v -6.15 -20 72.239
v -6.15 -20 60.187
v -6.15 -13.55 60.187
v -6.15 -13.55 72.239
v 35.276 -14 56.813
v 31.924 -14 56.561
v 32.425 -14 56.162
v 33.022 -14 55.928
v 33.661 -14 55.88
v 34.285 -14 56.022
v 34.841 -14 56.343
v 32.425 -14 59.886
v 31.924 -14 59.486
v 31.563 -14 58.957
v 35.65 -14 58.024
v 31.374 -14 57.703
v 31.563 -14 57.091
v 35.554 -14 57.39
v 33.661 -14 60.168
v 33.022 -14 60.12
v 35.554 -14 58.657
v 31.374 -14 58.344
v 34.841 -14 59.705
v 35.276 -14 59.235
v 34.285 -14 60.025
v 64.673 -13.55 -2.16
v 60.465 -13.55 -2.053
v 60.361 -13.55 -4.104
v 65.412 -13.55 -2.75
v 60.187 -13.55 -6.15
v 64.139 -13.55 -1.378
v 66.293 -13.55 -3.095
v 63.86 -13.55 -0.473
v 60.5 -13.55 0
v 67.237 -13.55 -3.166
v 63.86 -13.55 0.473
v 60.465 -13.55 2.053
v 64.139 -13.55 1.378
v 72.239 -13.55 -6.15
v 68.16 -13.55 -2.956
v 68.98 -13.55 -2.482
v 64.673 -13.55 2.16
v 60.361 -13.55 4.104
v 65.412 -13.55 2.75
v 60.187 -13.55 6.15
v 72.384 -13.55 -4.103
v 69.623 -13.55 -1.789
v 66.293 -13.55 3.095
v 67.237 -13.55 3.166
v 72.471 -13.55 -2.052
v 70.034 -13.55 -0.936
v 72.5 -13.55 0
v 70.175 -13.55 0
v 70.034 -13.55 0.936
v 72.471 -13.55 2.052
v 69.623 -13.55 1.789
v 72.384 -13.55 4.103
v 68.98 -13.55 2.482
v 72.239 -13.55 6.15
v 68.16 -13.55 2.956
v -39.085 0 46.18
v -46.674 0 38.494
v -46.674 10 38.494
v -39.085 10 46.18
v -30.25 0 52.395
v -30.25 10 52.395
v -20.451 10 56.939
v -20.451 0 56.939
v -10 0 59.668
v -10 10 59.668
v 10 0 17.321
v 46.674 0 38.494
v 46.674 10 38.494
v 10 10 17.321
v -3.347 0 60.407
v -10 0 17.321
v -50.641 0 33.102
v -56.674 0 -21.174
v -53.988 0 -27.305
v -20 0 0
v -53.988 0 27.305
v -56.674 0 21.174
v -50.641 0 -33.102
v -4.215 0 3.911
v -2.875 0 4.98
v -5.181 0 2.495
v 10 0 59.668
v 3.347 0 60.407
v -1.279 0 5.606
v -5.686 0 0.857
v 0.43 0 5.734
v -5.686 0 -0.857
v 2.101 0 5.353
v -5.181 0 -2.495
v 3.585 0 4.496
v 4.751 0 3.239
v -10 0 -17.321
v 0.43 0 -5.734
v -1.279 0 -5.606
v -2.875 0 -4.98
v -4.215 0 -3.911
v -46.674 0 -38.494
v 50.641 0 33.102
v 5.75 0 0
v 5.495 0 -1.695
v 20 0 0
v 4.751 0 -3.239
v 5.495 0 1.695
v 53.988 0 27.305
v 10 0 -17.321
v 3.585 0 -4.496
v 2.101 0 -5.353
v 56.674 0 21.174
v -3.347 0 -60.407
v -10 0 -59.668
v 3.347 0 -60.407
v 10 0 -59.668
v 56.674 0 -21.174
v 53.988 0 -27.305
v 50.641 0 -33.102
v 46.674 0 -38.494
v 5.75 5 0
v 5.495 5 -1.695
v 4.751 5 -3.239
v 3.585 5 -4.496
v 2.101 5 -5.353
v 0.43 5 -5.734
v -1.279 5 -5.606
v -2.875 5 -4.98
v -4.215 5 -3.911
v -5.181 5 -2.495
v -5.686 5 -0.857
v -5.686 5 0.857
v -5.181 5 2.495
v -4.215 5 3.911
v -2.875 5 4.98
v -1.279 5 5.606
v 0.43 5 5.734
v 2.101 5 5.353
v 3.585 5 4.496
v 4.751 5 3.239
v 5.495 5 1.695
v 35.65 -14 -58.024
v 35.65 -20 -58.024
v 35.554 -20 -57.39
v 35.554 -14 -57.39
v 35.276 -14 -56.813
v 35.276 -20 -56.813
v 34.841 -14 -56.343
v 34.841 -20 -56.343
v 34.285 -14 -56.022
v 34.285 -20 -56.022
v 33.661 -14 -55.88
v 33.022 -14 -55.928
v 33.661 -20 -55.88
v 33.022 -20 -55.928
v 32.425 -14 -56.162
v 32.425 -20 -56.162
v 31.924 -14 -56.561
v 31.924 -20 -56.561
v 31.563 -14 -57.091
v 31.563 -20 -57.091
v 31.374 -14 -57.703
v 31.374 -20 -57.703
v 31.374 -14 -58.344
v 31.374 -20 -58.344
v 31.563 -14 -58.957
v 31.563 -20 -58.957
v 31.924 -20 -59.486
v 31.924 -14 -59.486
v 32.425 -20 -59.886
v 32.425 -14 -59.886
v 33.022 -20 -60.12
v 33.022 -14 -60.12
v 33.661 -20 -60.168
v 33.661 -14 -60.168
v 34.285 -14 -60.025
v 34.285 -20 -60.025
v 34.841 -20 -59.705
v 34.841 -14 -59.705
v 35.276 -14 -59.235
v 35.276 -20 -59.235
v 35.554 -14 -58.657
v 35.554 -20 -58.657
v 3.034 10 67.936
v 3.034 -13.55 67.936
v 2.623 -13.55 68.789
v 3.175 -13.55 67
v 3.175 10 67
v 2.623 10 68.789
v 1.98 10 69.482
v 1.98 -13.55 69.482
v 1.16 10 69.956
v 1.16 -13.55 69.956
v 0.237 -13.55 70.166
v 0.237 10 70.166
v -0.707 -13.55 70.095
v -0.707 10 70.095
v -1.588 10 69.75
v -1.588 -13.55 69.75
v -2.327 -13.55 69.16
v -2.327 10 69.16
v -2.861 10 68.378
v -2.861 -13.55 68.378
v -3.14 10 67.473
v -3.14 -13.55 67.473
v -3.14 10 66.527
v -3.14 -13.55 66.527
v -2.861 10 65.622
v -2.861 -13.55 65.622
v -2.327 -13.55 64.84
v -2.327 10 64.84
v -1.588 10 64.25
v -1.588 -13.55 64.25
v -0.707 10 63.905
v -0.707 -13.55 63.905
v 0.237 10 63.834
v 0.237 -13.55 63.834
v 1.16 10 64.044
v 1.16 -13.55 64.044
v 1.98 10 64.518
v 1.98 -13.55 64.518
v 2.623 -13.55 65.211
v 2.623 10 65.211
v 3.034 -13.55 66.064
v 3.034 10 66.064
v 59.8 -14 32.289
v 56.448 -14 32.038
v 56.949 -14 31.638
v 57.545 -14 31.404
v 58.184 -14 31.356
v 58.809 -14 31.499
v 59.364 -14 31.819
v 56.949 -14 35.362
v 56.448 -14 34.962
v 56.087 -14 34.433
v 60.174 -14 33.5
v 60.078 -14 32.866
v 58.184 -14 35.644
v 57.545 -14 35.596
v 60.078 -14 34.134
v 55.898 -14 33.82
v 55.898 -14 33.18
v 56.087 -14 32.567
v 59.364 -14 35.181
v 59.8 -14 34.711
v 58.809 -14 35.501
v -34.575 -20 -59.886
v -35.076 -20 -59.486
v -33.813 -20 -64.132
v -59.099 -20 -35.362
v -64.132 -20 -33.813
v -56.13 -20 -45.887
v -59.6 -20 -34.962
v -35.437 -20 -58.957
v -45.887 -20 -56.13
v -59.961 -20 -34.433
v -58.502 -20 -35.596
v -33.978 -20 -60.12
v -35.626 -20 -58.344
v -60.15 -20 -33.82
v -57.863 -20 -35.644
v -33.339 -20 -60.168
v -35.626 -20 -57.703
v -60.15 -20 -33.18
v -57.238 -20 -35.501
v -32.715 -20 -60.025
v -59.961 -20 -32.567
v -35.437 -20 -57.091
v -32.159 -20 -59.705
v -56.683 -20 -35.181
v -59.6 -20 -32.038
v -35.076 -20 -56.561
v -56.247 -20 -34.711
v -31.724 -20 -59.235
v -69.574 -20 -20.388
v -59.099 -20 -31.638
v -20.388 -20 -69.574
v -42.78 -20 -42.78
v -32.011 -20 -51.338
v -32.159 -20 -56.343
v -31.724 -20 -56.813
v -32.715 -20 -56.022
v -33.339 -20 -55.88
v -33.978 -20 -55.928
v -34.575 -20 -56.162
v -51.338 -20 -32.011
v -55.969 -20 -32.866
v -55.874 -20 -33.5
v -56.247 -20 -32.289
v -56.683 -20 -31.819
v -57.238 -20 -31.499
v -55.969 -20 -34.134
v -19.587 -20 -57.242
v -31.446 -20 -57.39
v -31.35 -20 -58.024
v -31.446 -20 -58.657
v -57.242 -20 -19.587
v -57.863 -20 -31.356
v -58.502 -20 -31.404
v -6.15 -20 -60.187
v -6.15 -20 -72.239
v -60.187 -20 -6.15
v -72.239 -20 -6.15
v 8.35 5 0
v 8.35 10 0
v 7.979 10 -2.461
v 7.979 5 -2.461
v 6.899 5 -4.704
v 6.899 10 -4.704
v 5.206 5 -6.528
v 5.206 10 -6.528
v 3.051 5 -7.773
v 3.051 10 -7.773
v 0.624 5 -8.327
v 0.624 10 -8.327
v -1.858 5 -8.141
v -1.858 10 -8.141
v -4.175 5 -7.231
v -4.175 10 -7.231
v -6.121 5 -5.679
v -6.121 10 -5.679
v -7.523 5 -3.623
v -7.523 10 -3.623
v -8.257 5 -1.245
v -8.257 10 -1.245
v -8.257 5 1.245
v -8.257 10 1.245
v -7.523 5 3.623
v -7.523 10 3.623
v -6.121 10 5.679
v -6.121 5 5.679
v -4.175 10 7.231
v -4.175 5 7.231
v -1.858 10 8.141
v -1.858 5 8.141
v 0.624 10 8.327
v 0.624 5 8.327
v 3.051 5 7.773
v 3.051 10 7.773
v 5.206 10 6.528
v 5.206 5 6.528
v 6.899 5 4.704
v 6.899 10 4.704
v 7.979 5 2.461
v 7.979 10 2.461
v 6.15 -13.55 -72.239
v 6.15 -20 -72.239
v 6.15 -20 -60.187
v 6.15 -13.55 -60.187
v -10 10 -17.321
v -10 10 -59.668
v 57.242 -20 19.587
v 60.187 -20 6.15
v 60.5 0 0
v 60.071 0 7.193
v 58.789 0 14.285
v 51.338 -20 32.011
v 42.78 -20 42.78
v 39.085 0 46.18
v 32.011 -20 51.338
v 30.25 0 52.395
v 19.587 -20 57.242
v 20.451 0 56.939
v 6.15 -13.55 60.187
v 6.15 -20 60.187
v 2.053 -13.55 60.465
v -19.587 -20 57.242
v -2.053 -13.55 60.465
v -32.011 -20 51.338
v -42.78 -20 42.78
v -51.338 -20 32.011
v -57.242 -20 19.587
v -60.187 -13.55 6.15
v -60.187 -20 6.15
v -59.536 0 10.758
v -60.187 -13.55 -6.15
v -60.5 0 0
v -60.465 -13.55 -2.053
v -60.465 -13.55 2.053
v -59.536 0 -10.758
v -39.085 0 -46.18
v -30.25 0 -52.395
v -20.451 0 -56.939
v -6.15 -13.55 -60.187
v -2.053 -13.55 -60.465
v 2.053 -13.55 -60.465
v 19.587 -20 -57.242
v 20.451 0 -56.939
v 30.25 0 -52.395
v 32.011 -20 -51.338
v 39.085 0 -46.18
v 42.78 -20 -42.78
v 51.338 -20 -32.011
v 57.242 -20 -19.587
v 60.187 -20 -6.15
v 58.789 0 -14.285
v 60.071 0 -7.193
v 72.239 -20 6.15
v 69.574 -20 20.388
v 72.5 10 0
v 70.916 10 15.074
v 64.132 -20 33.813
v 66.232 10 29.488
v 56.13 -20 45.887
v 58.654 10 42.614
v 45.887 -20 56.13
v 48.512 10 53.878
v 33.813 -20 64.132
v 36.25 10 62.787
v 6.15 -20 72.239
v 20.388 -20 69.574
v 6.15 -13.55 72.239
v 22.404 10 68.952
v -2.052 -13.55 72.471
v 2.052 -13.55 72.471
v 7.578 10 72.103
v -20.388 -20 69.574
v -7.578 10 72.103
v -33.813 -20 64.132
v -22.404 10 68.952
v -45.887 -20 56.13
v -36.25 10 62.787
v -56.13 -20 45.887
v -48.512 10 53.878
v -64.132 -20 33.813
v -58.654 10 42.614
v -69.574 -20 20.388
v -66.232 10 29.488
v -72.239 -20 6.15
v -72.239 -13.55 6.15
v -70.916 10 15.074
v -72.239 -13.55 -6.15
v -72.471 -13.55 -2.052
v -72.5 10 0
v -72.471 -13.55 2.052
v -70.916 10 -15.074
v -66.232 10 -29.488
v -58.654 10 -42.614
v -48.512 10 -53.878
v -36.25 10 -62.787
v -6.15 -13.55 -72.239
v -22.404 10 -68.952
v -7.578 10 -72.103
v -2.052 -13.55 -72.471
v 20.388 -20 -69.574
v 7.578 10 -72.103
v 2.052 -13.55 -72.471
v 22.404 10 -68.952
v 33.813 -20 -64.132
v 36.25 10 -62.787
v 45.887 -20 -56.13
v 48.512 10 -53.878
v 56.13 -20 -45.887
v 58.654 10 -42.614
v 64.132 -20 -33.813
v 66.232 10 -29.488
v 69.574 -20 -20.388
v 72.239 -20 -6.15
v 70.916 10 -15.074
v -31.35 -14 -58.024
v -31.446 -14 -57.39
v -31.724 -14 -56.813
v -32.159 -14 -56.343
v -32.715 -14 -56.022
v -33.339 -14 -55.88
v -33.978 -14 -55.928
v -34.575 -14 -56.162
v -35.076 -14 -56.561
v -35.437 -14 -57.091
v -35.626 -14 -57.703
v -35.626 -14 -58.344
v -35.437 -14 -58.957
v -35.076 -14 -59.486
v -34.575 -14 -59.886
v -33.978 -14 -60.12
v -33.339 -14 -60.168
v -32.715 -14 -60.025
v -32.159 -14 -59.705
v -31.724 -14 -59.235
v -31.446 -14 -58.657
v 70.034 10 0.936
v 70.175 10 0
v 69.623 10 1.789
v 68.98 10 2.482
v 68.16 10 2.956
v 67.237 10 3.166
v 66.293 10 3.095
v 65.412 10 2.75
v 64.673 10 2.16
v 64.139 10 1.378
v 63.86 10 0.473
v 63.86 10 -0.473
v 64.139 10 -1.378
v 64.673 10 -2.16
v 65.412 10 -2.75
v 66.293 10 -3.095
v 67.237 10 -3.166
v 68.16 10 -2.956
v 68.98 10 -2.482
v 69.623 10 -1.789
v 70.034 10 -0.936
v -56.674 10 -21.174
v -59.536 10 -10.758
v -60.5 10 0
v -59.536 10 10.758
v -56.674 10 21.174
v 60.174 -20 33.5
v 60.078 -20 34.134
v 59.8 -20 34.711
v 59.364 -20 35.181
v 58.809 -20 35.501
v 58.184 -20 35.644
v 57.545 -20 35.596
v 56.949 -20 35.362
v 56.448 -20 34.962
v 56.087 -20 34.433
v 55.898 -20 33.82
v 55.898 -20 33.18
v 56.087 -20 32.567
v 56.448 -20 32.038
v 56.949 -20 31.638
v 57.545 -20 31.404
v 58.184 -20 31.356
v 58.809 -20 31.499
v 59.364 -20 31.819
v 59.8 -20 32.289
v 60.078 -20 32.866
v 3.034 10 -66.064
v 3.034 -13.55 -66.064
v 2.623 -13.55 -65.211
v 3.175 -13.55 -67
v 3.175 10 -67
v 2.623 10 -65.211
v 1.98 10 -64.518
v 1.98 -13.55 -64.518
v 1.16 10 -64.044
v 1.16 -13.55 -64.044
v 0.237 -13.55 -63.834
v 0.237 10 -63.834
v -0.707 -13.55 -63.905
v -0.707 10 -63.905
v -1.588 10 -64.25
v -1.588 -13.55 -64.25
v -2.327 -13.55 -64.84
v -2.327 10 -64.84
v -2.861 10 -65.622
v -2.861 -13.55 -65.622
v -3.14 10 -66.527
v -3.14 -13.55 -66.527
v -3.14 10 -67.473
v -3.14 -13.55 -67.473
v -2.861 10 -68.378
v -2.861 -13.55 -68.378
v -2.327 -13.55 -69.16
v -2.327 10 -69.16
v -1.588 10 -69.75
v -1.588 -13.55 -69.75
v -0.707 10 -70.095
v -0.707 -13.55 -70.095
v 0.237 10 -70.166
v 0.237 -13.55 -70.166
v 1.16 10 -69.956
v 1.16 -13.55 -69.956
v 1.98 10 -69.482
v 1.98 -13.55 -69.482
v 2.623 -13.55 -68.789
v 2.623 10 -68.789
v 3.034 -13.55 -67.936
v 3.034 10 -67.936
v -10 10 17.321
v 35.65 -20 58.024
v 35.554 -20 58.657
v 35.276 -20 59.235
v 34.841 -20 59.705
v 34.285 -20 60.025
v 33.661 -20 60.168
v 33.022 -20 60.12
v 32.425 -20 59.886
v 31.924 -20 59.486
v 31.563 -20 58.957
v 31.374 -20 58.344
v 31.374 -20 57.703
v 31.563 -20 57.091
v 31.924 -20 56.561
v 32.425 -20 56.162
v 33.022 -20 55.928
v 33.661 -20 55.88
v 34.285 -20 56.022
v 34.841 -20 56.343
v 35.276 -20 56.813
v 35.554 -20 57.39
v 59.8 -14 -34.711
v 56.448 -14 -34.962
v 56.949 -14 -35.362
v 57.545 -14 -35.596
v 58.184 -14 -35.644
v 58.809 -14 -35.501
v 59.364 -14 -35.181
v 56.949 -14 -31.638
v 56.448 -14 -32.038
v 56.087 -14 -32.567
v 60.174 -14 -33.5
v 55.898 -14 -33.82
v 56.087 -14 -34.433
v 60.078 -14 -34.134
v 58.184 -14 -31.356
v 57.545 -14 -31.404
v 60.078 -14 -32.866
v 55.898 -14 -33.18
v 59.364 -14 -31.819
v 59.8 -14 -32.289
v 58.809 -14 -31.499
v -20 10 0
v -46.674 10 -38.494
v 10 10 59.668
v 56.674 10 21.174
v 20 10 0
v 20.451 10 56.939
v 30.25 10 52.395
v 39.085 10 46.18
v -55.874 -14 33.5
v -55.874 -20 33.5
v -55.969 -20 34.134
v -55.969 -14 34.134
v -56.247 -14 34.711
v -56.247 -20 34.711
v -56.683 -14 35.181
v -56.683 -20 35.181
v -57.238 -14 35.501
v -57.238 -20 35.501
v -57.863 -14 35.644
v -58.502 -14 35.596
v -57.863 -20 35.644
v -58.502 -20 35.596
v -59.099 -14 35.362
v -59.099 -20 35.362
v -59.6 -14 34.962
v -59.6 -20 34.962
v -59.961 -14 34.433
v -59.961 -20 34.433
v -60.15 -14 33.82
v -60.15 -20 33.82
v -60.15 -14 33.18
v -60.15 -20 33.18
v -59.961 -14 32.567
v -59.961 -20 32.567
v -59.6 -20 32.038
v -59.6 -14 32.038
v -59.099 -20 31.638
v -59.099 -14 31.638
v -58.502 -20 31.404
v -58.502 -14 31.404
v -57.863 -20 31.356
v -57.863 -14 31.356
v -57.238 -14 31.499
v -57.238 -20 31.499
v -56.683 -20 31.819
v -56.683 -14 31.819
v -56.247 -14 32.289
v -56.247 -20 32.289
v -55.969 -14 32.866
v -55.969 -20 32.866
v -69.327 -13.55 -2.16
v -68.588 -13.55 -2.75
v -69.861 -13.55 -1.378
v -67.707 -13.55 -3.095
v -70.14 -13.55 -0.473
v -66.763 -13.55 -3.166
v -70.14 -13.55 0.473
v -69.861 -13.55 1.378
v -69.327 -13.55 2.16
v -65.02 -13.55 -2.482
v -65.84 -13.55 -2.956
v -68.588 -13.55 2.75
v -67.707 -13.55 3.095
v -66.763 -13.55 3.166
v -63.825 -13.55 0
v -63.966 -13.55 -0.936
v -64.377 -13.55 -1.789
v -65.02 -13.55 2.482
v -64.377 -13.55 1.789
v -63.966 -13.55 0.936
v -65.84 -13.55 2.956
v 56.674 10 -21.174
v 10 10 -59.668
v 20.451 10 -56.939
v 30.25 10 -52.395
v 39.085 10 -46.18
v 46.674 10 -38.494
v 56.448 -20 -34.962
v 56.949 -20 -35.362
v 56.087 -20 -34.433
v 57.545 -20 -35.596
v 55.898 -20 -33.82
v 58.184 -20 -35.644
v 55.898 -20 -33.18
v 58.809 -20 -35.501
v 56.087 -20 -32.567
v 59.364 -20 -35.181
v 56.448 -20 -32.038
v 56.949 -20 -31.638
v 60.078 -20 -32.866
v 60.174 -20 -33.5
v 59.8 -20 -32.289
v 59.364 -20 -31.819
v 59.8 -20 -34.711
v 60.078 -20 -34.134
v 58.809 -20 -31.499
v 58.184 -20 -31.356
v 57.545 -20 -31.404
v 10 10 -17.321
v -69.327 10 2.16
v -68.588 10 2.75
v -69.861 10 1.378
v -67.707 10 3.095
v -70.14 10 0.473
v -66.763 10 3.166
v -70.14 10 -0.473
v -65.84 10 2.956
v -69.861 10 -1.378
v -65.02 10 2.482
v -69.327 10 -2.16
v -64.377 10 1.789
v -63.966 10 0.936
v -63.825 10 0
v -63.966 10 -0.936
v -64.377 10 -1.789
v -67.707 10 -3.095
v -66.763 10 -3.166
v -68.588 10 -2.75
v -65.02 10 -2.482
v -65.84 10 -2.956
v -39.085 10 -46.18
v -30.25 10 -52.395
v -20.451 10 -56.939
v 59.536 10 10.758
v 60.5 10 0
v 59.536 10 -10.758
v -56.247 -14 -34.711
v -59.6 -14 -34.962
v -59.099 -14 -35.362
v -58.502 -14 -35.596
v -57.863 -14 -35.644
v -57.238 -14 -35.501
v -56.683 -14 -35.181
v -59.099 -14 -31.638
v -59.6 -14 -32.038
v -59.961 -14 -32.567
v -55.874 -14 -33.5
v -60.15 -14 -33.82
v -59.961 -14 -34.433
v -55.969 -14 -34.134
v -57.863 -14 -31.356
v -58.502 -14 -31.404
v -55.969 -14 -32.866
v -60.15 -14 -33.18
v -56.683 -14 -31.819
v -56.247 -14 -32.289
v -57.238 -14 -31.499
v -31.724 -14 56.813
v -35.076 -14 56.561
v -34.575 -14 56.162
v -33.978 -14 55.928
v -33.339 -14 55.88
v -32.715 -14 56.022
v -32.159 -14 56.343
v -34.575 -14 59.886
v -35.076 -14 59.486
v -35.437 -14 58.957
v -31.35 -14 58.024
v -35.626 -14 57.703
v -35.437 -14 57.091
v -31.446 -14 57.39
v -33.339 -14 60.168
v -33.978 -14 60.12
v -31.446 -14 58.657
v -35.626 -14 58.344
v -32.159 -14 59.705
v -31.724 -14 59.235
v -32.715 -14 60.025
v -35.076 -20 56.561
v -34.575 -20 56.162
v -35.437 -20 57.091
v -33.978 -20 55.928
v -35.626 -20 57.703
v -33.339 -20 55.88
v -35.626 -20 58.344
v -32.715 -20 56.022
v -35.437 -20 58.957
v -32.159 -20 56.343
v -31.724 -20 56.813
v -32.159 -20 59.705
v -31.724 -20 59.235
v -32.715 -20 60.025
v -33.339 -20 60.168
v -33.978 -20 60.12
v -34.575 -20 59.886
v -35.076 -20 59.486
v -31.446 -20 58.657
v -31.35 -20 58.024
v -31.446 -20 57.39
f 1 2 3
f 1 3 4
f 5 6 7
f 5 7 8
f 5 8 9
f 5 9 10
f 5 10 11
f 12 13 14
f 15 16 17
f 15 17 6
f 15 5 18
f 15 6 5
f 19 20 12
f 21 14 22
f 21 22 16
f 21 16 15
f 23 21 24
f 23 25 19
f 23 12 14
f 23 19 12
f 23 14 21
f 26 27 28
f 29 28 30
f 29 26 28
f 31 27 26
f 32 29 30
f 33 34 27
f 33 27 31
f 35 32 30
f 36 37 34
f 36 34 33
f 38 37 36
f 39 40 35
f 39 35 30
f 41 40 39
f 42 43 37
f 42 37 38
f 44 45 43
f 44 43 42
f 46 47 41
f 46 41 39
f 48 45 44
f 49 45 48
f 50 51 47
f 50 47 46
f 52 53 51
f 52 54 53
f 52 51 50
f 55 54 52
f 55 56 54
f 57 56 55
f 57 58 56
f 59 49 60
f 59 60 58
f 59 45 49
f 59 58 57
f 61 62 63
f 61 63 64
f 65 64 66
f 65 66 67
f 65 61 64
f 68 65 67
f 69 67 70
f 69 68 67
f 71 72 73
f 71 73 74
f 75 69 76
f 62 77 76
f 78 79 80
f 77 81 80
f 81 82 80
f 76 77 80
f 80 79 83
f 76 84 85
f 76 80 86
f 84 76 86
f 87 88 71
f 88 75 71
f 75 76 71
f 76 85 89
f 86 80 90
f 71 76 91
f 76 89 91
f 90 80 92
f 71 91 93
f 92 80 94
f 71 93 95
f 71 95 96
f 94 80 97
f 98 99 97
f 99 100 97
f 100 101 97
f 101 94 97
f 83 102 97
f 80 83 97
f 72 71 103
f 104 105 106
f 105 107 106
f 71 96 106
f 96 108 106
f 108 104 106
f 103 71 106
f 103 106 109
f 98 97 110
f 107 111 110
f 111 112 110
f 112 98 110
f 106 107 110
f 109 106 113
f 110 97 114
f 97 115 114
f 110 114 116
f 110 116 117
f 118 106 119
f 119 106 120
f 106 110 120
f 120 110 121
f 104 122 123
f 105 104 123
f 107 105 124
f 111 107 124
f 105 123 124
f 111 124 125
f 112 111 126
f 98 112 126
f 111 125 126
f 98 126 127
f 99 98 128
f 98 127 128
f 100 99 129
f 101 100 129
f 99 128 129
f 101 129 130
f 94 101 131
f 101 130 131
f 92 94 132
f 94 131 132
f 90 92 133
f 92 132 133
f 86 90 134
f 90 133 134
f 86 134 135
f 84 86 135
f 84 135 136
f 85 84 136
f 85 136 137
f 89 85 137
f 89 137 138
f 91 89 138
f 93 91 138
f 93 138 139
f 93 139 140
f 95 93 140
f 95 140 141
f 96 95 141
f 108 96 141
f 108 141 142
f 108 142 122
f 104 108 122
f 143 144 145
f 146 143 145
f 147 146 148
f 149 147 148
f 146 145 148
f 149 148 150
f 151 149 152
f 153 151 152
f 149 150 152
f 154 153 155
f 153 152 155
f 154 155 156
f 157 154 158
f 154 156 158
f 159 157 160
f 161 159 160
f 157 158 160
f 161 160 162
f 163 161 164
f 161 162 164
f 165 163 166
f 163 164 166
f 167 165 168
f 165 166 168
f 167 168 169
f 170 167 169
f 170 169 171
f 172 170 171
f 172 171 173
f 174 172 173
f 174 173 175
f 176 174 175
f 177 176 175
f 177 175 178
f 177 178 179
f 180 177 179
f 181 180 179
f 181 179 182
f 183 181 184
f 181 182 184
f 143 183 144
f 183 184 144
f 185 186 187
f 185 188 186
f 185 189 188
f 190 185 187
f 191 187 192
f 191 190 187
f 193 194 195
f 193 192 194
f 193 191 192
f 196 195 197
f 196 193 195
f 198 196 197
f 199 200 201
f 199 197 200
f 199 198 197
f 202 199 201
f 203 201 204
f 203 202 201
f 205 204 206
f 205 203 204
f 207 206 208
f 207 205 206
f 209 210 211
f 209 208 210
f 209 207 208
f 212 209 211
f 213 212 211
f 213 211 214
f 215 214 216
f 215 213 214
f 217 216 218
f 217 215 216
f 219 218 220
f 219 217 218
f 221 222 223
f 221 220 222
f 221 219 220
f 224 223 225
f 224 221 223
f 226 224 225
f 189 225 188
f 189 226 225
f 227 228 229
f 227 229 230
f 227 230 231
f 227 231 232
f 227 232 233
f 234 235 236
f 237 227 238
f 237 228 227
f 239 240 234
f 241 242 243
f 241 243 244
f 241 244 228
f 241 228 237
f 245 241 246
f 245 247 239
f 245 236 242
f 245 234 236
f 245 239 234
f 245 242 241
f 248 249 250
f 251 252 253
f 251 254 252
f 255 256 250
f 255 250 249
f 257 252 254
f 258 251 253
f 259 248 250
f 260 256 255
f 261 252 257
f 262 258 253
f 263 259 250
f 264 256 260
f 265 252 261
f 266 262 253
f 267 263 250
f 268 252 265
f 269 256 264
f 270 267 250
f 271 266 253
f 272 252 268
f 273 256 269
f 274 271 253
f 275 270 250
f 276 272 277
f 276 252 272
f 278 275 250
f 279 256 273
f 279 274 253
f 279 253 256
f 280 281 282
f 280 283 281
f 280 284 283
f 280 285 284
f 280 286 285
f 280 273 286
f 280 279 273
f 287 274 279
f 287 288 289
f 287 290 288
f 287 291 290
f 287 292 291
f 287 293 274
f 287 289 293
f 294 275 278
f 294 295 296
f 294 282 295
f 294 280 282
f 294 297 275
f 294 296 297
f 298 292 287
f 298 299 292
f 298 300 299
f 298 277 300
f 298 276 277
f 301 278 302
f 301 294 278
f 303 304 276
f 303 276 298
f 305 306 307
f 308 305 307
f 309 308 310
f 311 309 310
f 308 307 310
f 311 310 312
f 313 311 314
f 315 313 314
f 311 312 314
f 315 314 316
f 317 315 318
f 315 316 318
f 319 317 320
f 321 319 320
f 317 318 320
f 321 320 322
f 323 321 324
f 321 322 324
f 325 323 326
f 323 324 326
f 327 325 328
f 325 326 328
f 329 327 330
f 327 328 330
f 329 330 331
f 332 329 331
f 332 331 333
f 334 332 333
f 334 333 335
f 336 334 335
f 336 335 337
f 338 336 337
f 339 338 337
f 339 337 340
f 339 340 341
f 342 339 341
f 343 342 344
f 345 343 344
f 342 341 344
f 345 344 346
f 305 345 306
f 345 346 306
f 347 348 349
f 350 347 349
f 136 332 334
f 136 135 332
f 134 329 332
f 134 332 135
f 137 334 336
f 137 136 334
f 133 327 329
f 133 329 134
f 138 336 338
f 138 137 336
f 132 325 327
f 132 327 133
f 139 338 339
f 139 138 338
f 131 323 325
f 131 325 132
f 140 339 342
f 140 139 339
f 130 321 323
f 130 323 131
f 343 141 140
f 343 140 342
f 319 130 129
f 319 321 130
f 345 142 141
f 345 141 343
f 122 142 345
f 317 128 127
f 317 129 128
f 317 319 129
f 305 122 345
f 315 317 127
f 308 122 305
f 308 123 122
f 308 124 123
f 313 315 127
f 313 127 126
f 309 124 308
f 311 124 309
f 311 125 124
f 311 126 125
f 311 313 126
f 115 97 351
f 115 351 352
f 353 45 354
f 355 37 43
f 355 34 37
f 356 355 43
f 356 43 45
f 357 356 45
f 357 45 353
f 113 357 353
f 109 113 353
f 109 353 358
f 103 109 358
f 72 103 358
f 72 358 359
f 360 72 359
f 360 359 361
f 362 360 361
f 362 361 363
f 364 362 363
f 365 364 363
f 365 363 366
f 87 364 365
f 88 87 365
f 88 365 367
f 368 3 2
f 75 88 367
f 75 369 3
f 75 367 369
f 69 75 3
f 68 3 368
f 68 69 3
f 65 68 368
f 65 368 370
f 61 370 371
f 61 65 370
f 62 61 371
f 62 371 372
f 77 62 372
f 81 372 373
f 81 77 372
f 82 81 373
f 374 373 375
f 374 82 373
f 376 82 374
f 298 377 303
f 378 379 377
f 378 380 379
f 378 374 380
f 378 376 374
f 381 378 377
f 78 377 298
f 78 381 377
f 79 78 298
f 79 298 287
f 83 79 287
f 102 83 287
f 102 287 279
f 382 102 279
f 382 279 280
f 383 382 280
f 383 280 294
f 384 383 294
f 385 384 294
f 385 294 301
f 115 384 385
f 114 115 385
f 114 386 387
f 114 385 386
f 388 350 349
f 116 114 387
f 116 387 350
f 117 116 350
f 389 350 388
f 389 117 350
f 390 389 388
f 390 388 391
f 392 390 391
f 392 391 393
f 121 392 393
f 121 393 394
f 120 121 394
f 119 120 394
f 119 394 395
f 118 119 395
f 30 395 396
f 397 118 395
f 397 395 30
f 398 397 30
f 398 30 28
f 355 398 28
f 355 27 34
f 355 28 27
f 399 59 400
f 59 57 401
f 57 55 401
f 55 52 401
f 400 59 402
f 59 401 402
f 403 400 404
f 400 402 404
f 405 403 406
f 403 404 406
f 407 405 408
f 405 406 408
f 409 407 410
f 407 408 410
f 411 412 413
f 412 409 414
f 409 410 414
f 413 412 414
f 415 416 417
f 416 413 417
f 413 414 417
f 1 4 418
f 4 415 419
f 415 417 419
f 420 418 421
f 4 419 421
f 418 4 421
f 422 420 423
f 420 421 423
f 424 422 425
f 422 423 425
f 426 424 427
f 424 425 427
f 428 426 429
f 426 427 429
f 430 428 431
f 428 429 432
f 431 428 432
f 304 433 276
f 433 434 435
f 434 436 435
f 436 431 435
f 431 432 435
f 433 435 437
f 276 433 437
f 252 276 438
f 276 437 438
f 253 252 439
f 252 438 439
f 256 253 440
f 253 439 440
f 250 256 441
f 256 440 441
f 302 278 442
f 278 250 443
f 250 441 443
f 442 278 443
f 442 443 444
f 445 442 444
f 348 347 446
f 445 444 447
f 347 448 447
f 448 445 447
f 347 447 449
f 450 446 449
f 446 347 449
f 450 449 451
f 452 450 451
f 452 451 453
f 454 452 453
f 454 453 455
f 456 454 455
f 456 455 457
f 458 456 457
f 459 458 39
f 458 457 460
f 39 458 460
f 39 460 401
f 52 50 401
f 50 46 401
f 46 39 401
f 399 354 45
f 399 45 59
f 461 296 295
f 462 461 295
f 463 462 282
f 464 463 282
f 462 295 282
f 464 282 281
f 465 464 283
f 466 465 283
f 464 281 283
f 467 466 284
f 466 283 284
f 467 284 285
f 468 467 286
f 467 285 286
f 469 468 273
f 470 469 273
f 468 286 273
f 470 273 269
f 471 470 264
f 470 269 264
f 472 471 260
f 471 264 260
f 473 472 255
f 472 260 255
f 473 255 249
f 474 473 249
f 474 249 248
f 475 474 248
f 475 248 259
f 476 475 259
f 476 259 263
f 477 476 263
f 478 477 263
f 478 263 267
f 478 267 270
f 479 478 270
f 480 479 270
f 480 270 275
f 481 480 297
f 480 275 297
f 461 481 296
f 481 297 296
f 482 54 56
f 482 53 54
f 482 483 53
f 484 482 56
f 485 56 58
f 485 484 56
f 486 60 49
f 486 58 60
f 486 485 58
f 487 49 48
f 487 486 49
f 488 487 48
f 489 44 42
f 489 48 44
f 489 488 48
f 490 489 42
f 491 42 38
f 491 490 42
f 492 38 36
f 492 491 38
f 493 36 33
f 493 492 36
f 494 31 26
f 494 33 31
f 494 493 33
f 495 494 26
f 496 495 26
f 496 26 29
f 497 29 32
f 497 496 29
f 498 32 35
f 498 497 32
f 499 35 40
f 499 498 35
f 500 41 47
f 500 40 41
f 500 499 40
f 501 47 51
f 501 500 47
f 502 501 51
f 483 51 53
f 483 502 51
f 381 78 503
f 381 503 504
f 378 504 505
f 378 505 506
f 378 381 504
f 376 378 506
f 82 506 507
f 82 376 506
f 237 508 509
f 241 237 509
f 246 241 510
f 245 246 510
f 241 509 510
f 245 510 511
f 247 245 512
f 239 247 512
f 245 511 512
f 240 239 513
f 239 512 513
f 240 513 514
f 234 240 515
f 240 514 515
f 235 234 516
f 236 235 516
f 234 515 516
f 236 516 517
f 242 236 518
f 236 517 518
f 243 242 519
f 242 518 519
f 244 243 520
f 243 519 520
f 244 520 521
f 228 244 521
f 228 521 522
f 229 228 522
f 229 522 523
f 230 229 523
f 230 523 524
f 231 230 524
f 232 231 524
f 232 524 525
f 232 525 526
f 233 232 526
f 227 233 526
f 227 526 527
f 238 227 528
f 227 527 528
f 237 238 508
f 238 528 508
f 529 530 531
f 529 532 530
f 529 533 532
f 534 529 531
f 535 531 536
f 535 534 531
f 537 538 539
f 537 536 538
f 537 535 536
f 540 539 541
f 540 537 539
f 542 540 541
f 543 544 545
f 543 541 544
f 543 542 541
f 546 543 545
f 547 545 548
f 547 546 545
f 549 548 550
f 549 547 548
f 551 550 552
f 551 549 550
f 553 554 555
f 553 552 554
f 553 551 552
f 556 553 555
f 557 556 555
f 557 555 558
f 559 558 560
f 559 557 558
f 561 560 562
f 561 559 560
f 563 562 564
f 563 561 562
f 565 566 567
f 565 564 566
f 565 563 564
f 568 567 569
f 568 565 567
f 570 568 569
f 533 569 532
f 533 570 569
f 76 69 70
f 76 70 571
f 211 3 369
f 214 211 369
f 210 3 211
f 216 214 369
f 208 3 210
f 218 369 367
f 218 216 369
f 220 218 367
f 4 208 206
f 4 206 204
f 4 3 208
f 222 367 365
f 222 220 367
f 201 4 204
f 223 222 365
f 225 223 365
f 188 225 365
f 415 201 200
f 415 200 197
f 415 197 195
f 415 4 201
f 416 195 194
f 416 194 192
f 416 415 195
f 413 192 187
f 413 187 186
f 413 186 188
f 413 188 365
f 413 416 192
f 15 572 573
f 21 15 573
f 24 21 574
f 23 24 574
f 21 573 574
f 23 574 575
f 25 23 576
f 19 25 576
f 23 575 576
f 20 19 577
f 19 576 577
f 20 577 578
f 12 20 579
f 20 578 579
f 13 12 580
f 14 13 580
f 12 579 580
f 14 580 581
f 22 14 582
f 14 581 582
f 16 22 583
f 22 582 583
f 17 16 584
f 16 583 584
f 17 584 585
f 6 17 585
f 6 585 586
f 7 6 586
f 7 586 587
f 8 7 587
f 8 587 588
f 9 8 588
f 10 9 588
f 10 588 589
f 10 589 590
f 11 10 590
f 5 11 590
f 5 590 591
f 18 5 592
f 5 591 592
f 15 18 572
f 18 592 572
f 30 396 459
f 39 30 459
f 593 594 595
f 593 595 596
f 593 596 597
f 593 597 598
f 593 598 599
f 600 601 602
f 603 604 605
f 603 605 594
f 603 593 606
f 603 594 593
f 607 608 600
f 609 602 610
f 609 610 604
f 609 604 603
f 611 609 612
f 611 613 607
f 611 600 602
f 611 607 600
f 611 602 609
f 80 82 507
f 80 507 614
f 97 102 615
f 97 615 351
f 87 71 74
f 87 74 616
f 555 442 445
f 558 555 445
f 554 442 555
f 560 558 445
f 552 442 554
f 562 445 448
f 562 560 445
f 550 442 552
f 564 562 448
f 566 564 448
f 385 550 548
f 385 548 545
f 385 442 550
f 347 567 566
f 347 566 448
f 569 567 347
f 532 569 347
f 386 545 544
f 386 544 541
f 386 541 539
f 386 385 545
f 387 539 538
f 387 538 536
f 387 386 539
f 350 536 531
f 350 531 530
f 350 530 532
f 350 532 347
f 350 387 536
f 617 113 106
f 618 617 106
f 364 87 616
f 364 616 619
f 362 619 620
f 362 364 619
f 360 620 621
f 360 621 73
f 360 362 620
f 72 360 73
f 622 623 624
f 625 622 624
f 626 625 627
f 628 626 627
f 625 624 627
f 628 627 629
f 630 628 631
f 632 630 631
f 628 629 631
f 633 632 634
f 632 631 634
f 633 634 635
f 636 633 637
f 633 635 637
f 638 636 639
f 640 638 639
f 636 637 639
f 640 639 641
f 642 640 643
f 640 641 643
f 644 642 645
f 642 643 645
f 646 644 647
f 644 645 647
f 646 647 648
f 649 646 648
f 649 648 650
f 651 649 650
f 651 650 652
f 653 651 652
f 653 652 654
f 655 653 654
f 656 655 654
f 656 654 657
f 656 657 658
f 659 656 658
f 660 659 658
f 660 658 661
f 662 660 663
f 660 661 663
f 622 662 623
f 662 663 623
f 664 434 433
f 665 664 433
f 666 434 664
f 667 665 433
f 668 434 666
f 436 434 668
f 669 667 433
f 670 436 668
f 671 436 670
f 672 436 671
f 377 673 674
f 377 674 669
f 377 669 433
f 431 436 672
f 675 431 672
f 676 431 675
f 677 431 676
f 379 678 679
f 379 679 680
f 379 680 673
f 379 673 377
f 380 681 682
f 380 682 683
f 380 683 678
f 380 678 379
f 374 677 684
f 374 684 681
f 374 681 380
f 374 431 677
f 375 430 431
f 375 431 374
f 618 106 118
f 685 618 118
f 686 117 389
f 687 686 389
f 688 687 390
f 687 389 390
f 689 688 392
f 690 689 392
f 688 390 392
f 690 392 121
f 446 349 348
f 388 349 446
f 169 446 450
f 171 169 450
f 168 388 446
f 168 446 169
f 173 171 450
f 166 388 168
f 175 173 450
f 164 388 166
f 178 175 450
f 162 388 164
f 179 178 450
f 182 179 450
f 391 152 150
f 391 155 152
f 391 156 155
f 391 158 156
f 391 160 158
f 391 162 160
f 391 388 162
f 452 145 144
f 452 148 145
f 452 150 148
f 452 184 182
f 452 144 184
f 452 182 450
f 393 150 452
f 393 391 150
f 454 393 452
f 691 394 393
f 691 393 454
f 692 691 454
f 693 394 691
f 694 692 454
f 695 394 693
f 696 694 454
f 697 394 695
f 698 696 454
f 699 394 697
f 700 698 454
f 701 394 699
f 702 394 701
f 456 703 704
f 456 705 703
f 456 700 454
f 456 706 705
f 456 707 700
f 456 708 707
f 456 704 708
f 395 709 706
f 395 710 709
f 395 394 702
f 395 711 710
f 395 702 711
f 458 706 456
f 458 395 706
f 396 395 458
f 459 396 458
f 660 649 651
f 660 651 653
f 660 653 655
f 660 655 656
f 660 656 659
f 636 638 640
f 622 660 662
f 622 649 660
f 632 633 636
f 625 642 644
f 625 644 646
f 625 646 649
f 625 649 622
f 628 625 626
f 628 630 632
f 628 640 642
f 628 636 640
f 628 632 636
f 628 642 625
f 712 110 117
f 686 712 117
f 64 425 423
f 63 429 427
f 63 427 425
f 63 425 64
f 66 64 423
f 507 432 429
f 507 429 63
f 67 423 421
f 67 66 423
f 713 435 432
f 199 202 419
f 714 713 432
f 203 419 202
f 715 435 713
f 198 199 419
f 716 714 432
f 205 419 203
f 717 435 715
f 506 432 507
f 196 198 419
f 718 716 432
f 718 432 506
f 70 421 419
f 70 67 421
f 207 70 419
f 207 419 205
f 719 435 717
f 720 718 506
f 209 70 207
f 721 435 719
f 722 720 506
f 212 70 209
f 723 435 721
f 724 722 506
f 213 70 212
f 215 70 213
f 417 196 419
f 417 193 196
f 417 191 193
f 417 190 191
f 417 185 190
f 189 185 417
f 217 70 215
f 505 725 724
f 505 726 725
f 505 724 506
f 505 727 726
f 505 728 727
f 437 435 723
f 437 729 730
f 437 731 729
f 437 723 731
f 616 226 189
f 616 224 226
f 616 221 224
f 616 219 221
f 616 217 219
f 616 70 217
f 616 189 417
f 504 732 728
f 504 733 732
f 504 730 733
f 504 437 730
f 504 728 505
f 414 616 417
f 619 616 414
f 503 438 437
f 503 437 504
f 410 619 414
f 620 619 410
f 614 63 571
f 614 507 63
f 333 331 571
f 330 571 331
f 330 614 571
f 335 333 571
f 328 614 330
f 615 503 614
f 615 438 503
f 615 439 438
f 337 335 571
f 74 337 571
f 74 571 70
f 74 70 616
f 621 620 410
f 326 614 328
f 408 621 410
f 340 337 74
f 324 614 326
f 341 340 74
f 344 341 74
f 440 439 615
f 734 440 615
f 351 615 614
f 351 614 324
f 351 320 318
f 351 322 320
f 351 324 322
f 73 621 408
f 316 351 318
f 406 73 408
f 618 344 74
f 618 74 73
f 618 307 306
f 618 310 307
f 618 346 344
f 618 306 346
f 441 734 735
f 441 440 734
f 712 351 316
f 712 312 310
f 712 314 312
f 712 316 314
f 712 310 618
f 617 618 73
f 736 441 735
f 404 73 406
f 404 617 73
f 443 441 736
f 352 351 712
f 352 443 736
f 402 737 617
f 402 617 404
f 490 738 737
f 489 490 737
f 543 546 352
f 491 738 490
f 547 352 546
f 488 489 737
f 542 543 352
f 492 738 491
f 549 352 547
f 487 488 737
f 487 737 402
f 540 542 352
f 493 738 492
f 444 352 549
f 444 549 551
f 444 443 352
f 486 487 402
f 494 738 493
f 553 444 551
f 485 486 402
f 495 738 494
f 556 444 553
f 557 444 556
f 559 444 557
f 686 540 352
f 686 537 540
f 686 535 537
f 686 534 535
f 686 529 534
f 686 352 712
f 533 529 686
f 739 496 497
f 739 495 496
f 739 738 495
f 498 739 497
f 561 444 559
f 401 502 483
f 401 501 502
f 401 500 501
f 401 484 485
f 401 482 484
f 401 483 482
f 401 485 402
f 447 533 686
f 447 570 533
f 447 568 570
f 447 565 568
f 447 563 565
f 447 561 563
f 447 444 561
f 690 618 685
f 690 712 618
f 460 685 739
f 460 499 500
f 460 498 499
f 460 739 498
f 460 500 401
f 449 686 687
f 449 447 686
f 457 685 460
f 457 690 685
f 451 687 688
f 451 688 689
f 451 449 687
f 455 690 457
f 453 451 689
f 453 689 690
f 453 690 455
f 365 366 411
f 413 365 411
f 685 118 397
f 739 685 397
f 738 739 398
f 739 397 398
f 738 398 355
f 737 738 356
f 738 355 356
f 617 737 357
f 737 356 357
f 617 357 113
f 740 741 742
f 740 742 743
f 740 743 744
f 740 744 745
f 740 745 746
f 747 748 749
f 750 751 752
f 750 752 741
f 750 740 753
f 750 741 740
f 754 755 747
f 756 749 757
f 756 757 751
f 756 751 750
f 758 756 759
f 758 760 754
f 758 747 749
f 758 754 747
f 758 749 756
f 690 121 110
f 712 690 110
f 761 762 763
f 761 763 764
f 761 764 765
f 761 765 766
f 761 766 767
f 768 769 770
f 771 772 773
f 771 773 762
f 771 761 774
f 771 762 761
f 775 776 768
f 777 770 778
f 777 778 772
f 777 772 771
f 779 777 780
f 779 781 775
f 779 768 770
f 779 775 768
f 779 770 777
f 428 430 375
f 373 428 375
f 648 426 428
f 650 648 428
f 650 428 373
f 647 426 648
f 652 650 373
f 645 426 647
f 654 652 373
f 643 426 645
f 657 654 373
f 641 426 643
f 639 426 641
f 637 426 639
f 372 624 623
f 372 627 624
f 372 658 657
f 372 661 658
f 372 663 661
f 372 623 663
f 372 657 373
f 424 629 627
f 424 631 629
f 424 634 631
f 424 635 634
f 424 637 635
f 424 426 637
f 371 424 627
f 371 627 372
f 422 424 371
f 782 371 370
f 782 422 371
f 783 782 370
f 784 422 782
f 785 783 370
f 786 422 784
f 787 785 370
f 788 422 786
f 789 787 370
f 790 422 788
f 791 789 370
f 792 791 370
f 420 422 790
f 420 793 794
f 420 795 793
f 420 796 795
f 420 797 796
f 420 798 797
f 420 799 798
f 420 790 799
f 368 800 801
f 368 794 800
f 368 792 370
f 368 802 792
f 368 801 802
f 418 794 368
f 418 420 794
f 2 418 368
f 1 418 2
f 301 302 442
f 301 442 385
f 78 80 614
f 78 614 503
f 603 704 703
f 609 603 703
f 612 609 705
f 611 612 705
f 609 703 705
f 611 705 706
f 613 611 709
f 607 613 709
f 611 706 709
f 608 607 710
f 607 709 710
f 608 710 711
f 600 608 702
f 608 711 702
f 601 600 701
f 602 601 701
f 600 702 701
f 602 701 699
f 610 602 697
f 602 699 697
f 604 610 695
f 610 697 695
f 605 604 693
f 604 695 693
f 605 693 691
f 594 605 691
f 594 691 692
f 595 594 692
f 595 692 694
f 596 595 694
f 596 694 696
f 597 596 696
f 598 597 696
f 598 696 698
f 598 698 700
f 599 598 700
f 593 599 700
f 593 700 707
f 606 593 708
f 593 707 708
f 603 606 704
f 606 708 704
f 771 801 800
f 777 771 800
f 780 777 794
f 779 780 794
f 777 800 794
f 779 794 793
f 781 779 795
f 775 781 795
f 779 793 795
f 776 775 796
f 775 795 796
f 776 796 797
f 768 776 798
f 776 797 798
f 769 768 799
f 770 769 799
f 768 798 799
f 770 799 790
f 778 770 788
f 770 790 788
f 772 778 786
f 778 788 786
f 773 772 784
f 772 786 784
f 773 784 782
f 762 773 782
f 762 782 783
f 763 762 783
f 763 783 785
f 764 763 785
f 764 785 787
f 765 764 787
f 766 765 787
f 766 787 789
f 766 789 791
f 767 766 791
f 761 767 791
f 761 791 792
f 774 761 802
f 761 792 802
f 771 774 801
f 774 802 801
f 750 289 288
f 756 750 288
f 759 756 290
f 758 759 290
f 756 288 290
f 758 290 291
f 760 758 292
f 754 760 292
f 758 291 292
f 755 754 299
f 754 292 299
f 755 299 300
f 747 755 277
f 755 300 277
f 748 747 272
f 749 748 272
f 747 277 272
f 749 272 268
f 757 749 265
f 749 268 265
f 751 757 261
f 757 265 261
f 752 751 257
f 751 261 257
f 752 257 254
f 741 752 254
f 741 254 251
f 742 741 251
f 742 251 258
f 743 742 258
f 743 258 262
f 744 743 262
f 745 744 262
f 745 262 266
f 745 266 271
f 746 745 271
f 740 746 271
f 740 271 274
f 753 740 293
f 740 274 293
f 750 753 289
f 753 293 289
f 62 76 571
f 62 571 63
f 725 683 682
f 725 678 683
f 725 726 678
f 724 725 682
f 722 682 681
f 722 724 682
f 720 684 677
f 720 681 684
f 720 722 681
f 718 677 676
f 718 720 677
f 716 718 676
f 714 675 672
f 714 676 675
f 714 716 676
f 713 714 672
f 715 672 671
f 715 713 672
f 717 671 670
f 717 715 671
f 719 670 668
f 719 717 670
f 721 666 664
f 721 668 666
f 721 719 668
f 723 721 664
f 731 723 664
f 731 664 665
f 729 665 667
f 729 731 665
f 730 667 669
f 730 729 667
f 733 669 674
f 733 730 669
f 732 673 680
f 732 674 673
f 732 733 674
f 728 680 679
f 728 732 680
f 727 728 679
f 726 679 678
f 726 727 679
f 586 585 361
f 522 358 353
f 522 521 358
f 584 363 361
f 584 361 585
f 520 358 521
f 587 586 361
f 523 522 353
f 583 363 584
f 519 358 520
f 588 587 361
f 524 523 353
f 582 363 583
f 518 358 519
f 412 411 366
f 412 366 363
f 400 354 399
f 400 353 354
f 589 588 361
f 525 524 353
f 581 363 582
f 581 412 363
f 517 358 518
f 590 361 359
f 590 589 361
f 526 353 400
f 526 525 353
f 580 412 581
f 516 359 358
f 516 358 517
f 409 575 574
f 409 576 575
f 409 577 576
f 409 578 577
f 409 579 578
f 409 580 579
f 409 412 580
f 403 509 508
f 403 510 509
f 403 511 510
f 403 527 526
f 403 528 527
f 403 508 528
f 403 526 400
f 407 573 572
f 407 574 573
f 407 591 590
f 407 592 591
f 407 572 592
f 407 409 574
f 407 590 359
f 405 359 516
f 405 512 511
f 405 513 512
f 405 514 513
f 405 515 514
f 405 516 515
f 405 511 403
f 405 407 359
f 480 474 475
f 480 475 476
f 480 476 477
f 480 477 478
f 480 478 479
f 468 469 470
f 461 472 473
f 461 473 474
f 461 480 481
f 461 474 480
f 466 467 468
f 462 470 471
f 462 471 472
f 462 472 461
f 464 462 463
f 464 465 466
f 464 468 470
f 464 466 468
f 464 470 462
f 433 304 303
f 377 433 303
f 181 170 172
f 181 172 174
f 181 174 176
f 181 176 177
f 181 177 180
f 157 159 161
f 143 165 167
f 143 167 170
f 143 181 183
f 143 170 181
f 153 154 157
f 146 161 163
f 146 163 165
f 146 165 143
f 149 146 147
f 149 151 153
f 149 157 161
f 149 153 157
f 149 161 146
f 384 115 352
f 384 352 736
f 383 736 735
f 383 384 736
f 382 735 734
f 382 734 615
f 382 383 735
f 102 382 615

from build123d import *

# Parameters (mm, degrees)
SKETCH1_R               = 72.5
SKETCH1_R_2             = 3.175
BOSS_EXTRUDE1_DEPTH     = 10
SKETCH8_R               = 8.35
CUT_EXTRUDE4_DEPTH      = 5
SKETCH9_R               = 5.75
CUT_EXTRUDE5_DEPTH      = 1
CUT_EXTRUDE5_DEPTH_BACK = 11
SKETCH10_R              = 72.5
SKETCH10_R_2            = 60.5
SKETCH10_R_3            = 3.175
BOSS_EXTRUDE4_DEPTH     = 20
SKETCH11_W              = 32.27284004
SKETCH11_H              = 12.3
SKETCH11_W_2            = 12.3
SKETCH11_H_2            = 32.27284004
CUT_EXTRUDE6_DEPTH      = 6.45
SKETCH12_R              = 2.15
CUT_EXTRUDE7_DEPTH      = 6


with BuildPart() as part:
    # Sketch1 → Boss-Extrude1 (new body)
    with BuildSketch(Plane(origin=(0, 0, 0), x_dir=(1, 0, 0), z_dir=(0, 1, 0))):
        Circle(SKETCH1_R)
        with Locations((0, 67)):
            Circle(SKETCH1_R_2, mode=Mode.SUBTRACT)
        with Locations((67, 0)):
            Circle(SKETCH1_R_2, mode=Mode.SUBTRACT)
        with Locations((0, -67)):
            Circle(SKETCH1_R_2, mode=Mode.SUBTRACT)
        with Locations((-67, 0)):
            Circle(SKETCH1_R_2, mode=Mode.SUBTRACT)
        with BuildLine():
            Line((10, 17.320508076), (10, 59.667830529))
            ThreePointArc((10, 59.667830529), (30.25, 52.394536929), (46.673857027, 38.494169302))
            Line((46.673857027, 38.494169302), (10, 17.320508076))
        make_face(mode=Mode.SUBTRACT)
        with BuildLine():
            Line((-10, 17.320508076), (-10, 59.667830529))
            ThreePointArc((-10, 59.667830529), (-30.25, 52.394536929), (-46.673857027, 38.494169302))
            Line((-46.673857027, 38.494169302), (-10, 17.320508076))
        make_face(mode=Mode.SUBTRACT)
        with BuildLine():
            Line((-20, 0), (-56.673857027, 21.173661227))
            ThreePointArc((-56.673857027, 21.173661227), (-60.5, 0), (-56.673857027, -21.173661226))
            Line((-56.673857027, -21.173661226), (-20, 0))
        make_face(mode=Mode.SUBTRACT)
        with BuildLine():
            Line((-10, -17.320508076), (-46.673857027, -38.494169302))
            ThreePointArc((-46.673857027, -38.494169302), (-30.25, -52.394536929), (-10, -59.667830529))
            Line((-10, -59.667830529), (-10, -17.320508076))
        make_face(mode=Mode.SUBTRACT)
        with BuildLine():
            Line((10, -17.320508076), (10, -59.667830529))
            ThreePointArc((10, -59.667830529), (30.25, -52.394536929), (46.673857027, -38.494169302))
            Line((46.673857027, -38.494169302), (10, -17.320508076))
        make_face(mode=Mode.SUBTRACT)
        with BuildLine():
            Line((20, 0), (56.673857027, 21.173661227))
            ThreePointArc((56.673857027, 21.173661227), (60.5, 0), (56.673857027, -21.173661226))
            Line((56.673857027, -21.173661226), (20, 0))
        make_face(mode=Mode.SUBTRACT)
    extrude(amount=BOSS_EXTRUDE1_DEPTH)

    # Sketch8 → Cut-Extrude4 (cut)
    with BuildSketch(Plane(origin=(0, 10, 0), x_dir=(1, 0, 0), z_dir=(0, 1, 0))):
        Circle(SKETCH8_R)
    extrude(amount=-CUT_EXTRUDE4_DEPTH, mode=Mode.SUBTRACT)

    # Sketch9 → Cut-Extrude5 (cut, two sides)
    with BuildSketch(Plane(origin=(0, 10, 0), x_dir=(1, 0, 0), z_dir=(0, 1, 0))) as cut_extrude5_sk:
        Circle(SKETCH9_R)
    extrude(amount=CUT_EXTRUDE5_DEPTH, mode=Mode.SUBTRACT)
    extrude(cut_extrude5_sk.sketch, amount=-CUT_EXTRUDE5_DEPTH_BACK, mode=Mode.SUBTRACT)

    # Sketch10 → Boss-Extrude4 (add)
    with BuildSketch(Plane.XZ):
        Circle(SKETCH10_R)
        Circle(SKETCH10_R_2, mode=Mode.SUBTRACT)
        with Locations((0, -67)):
            Circle(SKETCH10_R_3, mode=Mode.SUBTRACT)
        with Locations((-67, 0)):
            Circle(SKETCH10_R_3, mode=Mode.SUBTRACT)
        with Locations((0, 67)):
            Circle(SKETCH10_R_3, mode=Mode.SUBTRACT)
        with Locations((67, 0)):
            Circle(SKETCH10_R_3, mode=Mode.SUBTRACT)
    extrude(amount=BOSS_EXTRUDE4_DEPTH)

    # Sketch11 → Cut-Extrude6 (cut)
    with BuildSketch(Plane.XZ.offset(20)):
        with Locations((-60.5, 0)):
            Rectangle(SKETCH11_W, SKETCH11_H)
        with Locations((0, -60.5)):
            Rectangle(SKETCH11_W_2, SKETCH11_H_2)
        with Locations((0, 60.5)):
            Rectangle(SKETCH11_W_2, SKETCH11_H_2)
        with Locations((60.5, 0)):
            Rectangle(SKETCH11_W, SKETCH11_H)
    extrude(amount=-CUT_EXTRUDE6_DEPTH, mode=Mode.SUBTRACT)

    # Sketch12 → Cut-Extrude7 (cut)
    with BuildSketch(Plane.XZ.offset(20)):
        with Locations((33.5, 58.023702054)):
            Circle(SKETCH12_R)
        with Locations((58.023702054, 33.5)):
            Circle(SKETCH12_R)
        with Locations((33.5, -58.023702054)):
            Circle(SKETCH12_R)
        with Locations((58.023702054, -33.5)):
            Circle(SKETCH12_R)
        with Locations((-58.023702054, -33.5)):
            Circle(SKETCH12_R)
        with Locations((-33.5, -58.023702054)):
            Circle(SKETCH12_R)
        with Locations((-33.5, 58.023702054)):
            Circle(SKETCH12_R)
        with Locations((-58.023702054, 33.5)):
            Circle(SKETCH12_R)
    extrude(amount=-CUT_EXTRUDE7_DEPTH, mode=Mode.SUBTRACT)


solid = part.part
